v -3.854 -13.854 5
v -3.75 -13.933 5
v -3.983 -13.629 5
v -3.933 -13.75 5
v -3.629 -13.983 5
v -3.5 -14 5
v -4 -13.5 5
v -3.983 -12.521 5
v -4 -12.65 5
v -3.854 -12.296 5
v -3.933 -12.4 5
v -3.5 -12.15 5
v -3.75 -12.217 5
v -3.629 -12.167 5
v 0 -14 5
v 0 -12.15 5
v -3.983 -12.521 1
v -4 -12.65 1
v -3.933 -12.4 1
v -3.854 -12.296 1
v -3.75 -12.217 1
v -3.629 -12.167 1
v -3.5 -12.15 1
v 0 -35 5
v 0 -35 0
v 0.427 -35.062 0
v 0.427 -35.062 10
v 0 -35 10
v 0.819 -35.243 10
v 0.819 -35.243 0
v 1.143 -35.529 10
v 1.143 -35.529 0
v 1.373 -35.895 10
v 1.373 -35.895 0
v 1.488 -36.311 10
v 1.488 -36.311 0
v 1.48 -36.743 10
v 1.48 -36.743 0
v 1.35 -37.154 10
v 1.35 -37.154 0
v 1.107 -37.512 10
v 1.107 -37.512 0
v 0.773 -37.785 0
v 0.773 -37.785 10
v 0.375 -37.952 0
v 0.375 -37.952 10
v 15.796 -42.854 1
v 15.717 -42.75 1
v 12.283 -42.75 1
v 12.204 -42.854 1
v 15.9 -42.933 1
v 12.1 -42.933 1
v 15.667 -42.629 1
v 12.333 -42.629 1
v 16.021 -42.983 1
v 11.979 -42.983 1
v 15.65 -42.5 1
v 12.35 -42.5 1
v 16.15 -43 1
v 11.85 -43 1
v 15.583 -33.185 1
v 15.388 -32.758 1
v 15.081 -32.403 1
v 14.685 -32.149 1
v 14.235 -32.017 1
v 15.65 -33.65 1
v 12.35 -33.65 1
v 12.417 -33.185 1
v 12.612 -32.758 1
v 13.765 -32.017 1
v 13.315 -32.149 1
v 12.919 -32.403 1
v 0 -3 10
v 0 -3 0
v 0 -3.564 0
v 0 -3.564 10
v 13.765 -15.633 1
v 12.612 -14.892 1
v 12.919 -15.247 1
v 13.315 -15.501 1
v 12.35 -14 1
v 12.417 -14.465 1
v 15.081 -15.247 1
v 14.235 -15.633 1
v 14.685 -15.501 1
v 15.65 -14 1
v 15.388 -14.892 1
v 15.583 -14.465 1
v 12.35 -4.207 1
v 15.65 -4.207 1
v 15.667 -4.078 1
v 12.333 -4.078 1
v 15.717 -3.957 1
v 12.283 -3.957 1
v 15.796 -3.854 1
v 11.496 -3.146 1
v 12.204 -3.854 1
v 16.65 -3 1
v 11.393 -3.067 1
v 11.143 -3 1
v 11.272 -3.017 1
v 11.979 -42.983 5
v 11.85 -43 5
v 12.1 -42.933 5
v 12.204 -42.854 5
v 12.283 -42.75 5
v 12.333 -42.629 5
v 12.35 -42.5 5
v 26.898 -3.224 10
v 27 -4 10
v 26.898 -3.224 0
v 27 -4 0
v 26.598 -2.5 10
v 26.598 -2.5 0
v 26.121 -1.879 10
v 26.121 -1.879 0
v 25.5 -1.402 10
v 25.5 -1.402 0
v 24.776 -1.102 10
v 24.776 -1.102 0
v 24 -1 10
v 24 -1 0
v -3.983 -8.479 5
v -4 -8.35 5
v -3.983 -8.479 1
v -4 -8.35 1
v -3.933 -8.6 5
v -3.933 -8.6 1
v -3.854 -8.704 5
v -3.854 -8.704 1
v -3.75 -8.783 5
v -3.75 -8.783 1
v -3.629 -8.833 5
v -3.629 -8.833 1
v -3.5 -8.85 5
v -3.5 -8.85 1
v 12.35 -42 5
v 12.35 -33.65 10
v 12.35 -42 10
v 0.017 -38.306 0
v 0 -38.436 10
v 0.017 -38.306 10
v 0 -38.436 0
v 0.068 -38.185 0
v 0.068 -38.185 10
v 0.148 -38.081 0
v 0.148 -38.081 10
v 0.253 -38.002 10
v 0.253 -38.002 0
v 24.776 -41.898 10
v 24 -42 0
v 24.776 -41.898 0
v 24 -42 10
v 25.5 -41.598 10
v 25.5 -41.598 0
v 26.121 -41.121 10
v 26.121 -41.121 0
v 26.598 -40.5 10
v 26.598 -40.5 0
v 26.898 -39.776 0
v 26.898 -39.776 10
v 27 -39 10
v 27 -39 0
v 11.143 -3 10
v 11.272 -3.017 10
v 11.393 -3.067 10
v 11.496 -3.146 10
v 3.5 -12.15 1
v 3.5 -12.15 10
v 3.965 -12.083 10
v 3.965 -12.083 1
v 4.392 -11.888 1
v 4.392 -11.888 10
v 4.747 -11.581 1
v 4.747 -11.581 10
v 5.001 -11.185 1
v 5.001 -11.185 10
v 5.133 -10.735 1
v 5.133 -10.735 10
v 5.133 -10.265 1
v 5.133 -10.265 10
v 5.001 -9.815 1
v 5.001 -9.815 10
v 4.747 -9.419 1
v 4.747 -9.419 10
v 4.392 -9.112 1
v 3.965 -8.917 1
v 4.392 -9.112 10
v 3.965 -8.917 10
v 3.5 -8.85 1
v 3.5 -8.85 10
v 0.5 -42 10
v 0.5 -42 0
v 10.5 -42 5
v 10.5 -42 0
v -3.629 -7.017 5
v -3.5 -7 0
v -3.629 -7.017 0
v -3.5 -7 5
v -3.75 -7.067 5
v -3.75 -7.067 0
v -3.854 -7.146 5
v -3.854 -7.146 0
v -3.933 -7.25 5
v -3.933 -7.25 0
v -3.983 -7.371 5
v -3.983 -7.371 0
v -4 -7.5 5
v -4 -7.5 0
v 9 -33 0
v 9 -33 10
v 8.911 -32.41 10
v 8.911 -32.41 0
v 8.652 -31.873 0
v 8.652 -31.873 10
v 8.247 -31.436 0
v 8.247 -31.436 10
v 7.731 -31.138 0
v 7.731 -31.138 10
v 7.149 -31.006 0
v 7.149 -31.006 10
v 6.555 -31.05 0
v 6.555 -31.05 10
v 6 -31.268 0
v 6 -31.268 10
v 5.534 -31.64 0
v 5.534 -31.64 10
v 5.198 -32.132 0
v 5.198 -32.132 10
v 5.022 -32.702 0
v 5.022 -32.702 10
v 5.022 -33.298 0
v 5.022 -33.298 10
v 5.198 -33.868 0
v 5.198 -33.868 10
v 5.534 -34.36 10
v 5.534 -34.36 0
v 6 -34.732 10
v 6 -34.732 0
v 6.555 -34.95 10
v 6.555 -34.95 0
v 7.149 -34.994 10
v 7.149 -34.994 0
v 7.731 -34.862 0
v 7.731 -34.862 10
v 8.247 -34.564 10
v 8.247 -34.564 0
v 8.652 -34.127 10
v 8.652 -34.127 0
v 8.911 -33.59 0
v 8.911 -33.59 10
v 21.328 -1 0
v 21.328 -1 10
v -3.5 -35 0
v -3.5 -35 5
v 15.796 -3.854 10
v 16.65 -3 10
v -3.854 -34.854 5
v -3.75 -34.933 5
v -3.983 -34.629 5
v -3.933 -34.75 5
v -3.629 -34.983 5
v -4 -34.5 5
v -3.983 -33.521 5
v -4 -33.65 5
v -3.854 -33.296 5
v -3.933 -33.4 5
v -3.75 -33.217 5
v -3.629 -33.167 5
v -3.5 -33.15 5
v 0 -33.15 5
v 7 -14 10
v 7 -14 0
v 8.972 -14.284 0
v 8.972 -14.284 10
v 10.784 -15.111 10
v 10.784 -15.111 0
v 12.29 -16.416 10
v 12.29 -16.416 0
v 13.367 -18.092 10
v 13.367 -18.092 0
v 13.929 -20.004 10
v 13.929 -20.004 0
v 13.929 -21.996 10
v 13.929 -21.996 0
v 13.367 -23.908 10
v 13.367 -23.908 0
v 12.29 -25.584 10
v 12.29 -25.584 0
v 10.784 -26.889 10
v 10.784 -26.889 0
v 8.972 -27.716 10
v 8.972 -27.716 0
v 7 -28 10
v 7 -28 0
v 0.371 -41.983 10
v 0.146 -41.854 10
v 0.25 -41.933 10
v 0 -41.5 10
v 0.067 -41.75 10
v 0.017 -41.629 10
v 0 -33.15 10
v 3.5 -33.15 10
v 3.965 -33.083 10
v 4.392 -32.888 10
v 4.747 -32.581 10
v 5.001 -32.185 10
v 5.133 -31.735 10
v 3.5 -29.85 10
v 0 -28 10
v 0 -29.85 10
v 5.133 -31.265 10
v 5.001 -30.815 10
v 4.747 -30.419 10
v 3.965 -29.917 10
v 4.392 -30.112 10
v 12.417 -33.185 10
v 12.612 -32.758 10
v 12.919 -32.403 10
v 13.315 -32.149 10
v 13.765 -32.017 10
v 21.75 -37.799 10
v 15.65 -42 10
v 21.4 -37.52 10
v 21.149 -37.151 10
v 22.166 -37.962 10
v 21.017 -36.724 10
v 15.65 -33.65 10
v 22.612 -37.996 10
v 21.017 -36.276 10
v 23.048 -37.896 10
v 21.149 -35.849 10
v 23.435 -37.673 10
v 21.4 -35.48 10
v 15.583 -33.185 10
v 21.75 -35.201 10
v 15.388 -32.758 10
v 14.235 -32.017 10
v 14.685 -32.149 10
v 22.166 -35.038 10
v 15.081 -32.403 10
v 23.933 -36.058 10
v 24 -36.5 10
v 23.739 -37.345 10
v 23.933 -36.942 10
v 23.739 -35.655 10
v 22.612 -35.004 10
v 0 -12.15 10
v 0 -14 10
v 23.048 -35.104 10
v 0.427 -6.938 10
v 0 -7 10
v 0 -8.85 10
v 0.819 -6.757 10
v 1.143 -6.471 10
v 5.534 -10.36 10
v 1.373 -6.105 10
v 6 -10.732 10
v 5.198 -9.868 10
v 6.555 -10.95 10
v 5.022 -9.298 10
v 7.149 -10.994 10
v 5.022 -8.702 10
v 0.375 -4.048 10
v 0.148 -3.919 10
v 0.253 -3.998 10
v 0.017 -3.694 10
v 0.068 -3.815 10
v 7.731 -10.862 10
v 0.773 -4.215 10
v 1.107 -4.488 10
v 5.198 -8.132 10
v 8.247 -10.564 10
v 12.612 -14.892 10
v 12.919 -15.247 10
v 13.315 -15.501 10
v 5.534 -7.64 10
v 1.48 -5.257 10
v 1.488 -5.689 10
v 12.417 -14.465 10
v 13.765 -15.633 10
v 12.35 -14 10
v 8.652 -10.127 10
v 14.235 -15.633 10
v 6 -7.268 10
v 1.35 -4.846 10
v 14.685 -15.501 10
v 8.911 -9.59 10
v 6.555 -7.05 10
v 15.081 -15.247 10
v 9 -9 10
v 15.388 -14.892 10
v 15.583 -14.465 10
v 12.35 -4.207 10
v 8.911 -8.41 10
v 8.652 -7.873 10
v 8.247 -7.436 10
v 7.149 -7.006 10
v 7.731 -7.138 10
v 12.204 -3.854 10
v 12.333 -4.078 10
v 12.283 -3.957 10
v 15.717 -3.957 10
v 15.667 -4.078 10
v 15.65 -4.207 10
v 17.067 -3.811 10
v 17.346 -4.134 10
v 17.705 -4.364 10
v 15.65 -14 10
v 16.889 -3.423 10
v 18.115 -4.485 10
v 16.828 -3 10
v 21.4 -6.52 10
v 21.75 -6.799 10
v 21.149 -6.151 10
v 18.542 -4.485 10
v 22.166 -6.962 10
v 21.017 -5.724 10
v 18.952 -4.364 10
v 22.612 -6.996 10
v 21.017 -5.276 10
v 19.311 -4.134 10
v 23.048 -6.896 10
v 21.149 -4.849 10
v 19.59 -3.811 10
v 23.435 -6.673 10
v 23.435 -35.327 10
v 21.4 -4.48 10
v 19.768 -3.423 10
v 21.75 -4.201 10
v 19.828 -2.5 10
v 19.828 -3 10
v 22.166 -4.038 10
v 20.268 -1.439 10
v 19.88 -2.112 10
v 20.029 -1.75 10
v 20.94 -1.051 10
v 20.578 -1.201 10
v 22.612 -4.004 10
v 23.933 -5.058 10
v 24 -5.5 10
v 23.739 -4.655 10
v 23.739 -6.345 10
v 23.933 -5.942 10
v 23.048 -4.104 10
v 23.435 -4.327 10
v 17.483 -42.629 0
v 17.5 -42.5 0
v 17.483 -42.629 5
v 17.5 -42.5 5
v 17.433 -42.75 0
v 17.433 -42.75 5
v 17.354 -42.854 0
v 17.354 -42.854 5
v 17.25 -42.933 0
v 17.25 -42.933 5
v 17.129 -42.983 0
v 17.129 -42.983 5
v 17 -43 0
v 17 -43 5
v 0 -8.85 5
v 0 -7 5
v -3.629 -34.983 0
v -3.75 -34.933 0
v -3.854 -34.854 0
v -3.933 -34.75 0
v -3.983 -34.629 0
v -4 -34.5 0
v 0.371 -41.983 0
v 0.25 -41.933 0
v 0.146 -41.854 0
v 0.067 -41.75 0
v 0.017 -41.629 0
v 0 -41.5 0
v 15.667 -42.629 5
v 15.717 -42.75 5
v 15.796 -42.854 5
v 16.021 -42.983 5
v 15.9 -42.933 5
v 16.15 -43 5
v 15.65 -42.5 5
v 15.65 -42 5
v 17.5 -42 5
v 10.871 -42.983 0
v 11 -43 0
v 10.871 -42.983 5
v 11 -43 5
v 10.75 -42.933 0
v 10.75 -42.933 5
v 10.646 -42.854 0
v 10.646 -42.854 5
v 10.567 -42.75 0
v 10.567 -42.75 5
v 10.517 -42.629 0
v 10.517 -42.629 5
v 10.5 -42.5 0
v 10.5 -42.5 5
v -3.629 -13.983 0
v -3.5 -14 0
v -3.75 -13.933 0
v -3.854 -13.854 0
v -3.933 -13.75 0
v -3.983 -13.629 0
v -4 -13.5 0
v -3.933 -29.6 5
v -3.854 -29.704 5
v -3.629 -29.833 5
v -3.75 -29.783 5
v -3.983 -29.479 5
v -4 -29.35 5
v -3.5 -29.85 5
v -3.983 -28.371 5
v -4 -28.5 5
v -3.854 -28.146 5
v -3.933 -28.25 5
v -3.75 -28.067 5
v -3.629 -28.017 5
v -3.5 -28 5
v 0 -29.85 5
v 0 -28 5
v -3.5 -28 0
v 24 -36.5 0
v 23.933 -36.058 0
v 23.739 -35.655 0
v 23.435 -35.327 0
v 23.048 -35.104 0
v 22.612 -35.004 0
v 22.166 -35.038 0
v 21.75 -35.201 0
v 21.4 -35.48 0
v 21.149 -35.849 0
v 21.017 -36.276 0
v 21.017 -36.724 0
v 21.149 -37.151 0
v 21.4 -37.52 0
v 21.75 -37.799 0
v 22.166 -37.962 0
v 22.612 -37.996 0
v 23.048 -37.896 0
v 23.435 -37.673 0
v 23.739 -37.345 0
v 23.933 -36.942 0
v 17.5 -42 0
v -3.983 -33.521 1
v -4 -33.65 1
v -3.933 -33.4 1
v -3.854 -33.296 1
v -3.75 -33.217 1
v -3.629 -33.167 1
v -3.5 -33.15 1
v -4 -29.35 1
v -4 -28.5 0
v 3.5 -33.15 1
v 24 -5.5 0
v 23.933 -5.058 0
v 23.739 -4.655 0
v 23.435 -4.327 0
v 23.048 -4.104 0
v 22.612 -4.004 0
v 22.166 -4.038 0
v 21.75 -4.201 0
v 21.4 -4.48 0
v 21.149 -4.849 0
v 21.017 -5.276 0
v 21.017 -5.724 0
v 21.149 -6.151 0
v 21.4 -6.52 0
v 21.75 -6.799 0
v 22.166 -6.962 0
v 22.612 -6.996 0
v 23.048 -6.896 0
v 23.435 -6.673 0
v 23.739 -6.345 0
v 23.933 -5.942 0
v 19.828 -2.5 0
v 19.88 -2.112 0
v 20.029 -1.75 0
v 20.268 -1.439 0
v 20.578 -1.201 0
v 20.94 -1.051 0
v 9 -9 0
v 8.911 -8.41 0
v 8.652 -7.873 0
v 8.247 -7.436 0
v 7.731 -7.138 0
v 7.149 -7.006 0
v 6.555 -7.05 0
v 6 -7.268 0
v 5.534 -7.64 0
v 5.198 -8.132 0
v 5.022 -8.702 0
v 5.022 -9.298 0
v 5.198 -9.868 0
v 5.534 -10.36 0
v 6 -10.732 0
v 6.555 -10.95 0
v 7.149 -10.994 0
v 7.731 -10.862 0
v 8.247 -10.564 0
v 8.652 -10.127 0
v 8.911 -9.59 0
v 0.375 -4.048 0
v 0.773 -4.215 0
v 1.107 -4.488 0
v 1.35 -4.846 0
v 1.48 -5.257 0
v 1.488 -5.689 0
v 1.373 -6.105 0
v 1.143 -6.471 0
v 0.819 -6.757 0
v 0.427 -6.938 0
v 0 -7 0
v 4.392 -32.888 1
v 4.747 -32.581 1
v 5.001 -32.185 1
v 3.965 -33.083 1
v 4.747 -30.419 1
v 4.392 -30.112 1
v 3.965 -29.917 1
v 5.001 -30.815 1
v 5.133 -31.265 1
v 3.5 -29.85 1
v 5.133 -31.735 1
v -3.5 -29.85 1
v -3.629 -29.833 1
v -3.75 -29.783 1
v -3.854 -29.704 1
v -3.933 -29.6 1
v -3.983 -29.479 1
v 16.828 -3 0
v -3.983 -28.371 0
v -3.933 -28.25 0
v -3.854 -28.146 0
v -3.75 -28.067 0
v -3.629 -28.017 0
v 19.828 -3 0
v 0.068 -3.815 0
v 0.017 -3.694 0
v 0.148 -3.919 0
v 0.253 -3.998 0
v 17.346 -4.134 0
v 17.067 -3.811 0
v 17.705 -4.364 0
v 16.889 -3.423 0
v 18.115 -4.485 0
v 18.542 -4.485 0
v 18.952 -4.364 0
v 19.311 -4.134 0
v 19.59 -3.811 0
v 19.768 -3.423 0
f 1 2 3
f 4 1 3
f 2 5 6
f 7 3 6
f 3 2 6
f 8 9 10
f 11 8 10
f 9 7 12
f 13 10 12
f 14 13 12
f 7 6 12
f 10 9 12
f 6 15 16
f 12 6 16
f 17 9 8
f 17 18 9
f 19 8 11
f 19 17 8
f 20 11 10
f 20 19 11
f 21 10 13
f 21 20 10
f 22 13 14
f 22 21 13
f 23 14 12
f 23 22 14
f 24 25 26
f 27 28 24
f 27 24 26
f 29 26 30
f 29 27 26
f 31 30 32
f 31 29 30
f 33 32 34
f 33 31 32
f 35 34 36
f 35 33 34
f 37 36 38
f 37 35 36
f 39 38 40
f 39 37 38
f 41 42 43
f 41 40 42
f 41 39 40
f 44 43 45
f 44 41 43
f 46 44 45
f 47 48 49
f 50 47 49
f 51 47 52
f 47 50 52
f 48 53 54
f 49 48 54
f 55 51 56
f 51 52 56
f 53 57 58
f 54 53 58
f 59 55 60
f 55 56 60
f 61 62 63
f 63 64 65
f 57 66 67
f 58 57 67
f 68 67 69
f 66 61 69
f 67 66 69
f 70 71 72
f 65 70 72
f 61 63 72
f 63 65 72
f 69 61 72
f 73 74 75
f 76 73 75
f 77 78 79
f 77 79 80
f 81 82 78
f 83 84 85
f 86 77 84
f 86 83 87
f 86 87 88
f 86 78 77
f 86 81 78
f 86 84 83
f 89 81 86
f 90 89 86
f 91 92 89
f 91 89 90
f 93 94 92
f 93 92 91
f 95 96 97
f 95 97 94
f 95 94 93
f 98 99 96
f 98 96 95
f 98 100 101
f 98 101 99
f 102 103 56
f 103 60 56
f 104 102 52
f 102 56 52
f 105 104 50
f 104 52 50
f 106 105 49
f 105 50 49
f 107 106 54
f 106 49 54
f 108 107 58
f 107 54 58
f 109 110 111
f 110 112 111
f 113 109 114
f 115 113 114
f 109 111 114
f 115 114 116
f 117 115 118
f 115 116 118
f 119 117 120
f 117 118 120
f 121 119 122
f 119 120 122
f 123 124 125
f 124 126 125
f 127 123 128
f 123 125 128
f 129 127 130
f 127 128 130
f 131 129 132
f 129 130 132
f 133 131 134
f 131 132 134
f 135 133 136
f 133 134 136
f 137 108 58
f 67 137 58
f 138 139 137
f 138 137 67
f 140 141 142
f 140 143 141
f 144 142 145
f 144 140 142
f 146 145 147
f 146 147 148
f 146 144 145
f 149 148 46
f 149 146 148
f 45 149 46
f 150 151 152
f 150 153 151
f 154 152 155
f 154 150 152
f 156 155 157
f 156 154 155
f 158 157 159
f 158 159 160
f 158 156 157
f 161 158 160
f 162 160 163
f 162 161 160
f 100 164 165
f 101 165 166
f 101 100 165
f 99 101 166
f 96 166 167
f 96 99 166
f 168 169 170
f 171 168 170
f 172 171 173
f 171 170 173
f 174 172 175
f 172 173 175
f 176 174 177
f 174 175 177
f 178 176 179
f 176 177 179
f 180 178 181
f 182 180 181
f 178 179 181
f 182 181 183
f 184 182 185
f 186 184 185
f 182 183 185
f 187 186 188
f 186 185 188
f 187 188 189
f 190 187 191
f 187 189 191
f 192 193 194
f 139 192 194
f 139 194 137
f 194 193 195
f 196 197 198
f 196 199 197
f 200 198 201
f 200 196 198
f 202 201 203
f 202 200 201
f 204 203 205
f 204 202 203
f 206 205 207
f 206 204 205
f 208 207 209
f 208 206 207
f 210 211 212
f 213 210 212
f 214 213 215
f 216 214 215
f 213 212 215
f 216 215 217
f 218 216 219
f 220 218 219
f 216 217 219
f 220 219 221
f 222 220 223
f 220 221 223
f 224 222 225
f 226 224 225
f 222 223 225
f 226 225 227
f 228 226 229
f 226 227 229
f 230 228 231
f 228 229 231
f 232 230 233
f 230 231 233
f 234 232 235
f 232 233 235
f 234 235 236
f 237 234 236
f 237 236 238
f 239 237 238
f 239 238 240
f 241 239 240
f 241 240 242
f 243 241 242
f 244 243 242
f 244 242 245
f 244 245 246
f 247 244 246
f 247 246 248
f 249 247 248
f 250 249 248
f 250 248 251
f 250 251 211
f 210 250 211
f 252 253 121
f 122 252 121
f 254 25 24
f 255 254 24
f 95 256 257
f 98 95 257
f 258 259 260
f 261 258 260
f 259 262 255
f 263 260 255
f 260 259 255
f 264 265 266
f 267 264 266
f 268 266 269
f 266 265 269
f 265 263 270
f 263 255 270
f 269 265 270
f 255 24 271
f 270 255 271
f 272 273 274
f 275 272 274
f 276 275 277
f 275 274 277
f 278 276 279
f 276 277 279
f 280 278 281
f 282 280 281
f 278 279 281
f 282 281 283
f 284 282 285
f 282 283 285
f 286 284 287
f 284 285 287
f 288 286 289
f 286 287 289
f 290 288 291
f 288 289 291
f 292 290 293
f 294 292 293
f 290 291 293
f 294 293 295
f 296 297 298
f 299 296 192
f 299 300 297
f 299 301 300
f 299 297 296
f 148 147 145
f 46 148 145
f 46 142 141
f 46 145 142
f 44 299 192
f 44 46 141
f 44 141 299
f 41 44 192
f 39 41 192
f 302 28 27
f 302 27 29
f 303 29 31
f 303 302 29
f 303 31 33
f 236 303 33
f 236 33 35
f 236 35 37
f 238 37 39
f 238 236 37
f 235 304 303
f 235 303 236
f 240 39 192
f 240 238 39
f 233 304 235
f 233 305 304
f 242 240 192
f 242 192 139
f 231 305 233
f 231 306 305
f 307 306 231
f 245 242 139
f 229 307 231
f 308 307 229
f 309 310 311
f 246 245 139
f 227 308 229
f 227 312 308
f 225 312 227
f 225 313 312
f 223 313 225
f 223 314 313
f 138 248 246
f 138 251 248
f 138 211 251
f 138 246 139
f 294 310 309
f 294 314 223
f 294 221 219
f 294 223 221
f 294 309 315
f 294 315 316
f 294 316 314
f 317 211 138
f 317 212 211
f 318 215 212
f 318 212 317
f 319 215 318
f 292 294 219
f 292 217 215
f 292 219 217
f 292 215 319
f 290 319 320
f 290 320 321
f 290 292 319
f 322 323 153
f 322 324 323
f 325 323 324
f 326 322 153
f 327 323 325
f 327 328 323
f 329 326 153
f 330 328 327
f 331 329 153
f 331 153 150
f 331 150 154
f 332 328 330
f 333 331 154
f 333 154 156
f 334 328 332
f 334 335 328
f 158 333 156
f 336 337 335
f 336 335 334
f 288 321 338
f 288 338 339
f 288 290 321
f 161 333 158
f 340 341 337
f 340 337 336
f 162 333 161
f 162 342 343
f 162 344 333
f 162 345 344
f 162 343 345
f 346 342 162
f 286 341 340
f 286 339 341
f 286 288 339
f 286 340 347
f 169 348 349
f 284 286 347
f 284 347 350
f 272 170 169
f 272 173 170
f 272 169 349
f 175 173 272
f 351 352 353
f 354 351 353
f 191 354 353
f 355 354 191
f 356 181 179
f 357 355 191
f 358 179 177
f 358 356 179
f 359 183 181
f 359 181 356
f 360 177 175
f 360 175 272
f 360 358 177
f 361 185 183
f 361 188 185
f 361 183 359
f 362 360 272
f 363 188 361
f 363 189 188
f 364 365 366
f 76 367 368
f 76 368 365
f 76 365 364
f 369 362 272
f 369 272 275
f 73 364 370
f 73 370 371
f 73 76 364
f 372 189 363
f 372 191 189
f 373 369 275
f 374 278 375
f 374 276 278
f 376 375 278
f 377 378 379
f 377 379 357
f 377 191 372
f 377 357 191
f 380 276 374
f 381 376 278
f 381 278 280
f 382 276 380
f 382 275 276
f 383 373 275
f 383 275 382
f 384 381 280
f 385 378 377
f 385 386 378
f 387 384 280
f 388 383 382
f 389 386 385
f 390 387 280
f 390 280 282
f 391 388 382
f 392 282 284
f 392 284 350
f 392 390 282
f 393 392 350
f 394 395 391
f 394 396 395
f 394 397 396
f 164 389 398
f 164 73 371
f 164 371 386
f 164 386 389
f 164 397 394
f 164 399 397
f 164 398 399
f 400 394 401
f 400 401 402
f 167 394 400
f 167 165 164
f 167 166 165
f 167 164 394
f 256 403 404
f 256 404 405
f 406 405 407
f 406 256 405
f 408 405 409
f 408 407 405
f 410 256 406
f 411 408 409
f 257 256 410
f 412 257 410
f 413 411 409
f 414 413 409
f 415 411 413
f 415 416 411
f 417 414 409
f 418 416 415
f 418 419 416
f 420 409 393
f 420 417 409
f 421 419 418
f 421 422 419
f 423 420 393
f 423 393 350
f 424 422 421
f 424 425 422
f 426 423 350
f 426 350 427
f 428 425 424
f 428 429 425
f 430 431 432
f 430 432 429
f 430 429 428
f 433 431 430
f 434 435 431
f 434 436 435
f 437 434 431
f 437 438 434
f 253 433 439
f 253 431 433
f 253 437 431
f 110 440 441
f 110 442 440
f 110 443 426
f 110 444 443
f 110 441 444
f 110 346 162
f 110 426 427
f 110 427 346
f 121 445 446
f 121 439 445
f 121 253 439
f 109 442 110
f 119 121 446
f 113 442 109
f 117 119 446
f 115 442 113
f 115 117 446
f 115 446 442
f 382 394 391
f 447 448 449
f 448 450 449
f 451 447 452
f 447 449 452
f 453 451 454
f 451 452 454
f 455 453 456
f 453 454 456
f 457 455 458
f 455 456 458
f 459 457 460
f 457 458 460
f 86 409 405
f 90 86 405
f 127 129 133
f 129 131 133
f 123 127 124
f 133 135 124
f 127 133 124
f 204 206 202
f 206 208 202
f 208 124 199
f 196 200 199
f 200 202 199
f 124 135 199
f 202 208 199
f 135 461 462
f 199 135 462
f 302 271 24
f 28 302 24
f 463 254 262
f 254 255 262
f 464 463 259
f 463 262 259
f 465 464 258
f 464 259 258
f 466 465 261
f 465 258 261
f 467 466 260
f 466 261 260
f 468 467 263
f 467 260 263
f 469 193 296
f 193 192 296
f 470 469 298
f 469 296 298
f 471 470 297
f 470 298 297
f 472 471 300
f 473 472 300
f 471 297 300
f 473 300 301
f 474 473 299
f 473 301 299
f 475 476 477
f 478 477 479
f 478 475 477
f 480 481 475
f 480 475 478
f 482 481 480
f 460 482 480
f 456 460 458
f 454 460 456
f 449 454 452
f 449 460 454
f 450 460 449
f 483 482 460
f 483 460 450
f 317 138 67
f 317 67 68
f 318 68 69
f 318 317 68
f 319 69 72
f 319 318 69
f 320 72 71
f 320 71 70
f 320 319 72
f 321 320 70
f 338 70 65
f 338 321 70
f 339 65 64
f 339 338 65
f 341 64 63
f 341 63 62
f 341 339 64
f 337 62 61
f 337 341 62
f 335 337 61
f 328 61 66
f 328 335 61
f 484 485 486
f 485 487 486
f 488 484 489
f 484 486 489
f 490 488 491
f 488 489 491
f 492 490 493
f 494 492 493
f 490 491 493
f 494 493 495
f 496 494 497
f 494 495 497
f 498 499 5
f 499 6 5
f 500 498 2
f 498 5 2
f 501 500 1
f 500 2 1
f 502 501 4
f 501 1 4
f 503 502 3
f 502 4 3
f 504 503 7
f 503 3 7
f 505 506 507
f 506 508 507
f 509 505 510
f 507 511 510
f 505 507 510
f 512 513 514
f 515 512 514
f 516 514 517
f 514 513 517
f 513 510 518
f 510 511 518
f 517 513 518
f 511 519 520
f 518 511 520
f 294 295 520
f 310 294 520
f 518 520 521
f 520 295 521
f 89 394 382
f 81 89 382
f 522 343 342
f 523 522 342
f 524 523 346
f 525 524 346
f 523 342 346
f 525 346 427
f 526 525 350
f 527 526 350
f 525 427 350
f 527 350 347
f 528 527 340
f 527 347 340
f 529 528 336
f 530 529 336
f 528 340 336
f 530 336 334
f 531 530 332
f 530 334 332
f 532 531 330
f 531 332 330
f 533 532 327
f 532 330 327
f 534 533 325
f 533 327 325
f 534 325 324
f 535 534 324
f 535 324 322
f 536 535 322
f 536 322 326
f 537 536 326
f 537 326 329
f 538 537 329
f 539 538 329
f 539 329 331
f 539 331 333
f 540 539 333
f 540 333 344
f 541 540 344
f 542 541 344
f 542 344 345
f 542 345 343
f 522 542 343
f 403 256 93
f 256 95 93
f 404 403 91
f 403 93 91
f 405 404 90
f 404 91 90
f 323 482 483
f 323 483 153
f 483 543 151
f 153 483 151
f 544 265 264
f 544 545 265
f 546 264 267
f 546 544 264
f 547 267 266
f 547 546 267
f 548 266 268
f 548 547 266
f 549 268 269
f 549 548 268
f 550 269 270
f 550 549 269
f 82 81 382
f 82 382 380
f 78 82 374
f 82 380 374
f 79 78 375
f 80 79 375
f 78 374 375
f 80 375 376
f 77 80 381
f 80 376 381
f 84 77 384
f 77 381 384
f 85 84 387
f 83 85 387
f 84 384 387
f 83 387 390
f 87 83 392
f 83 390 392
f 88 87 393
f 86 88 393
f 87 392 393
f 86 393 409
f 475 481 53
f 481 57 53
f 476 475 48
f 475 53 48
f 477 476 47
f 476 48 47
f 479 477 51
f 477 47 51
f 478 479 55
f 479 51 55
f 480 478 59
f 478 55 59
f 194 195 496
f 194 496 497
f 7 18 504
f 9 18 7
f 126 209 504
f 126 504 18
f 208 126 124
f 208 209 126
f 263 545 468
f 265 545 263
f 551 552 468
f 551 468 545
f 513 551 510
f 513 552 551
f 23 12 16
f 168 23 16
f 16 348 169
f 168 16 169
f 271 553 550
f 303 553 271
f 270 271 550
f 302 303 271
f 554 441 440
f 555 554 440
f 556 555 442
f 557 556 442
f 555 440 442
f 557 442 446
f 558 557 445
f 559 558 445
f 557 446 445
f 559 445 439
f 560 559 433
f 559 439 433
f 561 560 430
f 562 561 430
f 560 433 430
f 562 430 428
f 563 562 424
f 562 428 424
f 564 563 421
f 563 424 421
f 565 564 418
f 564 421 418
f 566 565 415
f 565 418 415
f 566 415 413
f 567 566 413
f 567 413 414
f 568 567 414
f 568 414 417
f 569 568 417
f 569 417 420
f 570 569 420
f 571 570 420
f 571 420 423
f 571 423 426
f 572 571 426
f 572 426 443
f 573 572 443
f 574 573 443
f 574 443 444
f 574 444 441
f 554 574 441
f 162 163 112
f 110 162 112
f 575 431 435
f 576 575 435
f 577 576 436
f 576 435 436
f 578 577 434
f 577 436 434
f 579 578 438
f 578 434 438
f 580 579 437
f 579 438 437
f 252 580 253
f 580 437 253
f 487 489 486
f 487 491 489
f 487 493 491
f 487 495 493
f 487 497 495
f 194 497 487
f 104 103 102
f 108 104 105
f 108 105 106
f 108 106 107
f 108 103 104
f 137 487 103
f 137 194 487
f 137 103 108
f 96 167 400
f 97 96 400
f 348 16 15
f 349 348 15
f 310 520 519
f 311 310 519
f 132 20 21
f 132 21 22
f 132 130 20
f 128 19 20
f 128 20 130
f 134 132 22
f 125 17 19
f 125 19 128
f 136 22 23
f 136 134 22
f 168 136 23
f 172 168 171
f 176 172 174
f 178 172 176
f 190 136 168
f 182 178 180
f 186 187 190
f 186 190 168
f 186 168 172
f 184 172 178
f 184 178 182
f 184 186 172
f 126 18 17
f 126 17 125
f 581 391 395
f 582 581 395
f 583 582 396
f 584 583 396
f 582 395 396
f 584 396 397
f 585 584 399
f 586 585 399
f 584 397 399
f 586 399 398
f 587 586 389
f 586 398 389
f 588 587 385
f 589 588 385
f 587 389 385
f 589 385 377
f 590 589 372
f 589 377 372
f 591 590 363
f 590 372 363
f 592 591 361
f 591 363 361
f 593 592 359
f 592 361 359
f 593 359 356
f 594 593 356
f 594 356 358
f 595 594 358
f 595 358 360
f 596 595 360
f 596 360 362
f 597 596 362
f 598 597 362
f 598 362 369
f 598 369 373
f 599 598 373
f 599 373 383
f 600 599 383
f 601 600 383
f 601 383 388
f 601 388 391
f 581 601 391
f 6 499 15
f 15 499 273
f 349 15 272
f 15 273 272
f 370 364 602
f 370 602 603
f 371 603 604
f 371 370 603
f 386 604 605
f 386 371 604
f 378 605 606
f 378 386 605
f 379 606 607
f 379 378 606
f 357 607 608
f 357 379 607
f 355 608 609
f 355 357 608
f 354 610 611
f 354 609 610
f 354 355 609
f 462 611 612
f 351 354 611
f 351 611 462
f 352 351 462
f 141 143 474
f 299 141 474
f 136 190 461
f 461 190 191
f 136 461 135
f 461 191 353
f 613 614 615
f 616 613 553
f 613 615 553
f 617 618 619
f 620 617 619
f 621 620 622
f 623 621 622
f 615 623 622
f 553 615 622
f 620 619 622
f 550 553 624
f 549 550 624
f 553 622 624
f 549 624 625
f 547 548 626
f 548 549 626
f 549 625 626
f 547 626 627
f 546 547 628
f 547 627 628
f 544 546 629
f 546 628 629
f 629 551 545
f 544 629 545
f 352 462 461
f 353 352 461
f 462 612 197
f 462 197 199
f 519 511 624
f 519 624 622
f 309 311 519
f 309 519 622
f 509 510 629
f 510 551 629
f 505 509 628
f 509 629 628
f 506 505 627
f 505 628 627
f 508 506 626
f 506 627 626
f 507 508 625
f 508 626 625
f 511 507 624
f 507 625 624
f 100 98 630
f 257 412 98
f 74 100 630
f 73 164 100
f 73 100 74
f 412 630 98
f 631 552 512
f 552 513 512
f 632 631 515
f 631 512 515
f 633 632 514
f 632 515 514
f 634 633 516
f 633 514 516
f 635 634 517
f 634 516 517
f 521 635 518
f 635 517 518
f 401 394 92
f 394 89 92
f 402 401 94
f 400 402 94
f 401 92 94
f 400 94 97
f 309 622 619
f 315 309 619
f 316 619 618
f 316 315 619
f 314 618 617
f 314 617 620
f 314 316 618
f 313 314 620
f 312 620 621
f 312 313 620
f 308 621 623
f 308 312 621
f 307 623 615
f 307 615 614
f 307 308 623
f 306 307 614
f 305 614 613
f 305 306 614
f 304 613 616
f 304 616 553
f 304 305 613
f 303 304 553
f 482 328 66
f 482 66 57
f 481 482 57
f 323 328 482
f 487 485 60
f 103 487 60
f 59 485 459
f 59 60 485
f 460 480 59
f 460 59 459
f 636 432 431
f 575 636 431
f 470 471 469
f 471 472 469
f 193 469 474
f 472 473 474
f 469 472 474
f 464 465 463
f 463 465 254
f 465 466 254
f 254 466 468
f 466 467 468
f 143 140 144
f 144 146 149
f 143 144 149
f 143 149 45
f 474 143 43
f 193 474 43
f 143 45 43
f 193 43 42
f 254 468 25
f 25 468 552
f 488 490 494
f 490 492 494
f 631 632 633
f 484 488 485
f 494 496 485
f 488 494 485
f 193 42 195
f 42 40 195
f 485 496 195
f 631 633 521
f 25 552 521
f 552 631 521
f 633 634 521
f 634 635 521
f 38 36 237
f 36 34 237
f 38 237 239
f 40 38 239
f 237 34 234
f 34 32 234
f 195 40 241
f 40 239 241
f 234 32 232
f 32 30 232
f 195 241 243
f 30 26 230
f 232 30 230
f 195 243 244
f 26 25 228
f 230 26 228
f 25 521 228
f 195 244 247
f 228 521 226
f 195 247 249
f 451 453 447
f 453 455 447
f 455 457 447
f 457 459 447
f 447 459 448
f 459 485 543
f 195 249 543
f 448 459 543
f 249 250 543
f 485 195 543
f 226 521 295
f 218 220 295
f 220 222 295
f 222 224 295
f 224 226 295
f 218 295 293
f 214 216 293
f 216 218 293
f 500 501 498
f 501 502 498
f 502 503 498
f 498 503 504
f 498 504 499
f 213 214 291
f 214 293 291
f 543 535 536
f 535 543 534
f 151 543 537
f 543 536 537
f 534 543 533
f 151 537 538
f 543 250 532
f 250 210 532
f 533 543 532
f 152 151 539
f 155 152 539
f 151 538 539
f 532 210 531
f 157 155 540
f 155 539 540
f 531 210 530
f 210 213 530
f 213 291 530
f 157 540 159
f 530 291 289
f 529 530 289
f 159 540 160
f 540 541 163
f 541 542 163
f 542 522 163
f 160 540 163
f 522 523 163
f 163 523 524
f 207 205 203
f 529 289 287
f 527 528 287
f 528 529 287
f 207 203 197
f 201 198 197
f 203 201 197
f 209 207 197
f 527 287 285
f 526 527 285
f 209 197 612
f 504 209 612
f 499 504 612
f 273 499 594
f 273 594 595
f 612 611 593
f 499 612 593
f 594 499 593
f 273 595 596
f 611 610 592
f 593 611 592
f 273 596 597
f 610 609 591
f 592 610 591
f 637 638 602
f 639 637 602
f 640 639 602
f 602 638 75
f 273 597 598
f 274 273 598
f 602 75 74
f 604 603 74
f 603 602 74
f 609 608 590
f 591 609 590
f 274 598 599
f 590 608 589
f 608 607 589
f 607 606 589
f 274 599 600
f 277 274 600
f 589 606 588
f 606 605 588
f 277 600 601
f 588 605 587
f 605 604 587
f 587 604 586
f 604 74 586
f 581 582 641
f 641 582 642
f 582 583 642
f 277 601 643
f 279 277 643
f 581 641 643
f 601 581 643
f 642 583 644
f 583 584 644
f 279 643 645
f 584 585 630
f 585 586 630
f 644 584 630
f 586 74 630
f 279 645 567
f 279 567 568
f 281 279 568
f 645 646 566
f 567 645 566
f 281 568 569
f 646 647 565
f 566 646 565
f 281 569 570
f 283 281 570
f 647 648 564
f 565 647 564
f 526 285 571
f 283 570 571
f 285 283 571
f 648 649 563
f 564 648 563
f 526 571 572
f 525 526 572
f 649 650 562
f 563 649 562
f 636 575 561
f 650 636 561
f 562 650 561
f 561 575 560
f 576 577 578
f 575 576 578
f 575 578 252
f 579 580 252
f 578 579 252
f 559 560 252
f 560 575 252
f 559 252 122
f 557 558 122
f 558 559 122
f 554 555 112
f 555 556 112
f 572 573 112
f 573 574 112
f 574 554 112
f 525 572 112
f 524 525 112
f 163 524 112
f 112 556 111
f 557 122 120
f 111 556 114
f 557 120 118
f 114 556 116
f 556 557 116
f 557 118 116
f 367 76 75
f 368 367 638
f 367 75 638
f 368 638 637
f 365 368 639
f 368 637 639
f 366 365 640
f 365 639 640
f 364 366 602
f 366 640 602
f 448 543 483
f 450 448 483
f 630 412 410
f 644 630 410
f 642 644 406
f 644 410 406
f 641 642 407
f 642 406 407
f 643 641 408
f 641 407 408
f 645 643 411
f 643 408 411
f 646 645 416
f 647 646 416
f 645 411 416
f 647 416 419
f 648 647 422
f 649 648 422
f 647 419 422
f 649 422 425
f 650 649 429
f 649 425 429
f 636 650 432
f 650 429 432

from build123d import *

# Parameters (mm, degrees)
BOSS_EXTRUDE5_DEPTH = 10
SKETCH32_W          = 5
SKETCH32_H          = 7
BOSS_EXTRUDE6_DEPTH = 4
SKETCH15_R          = 2
SKETCH15_R_2        = 1.5
CUT_EXTRUDE8_DEPTH  = 51.921508226
CUT_EXTRUDE18_DEPTH = 9
CUT_EXTRUDE19_DEPTH = 51.921508226
SKETCH20_W          = 18.573206134
SKETCH20_H          = 9.890954849
CUT_EXTRUDE12_DEPTH = 51.921508226
SKETCH28_W          = 11
SKETCH28_H          = 1
CUT_EXTRUDE15_DEPTH = 10
SKETCH37_W          = 7
SKETCH37_H          = 5
BOSS_EXTRUDE7_DEPTH = 1
CUT_EXTRUDE11_DEPTH = 9
CUT_EXTRUDE20_DEPTH = 52.749396132
BOSS_EXTRUDE8_START = -1
BOSS_EXTRUDE8_DEPTH = 1
FILLET15_R          = 3
FILLET16_R          = 0.5


with BuildPart() as part:
    # Sketch14 → Boss-Extrude5 (new body)
    with BuildSketch(Plane.XY):
        with BuildLine():
            Line((27, -8.5), (27, 0))
            Line((27, 0), (0, 0))
            Line((0, 0), (0, -14))
            Line((0, -14), (7, -14))
            ThreePointArc((7, -14), (14, -21), (7, -28))
            Line((7, -28), (0, -28))
            Line((0, -28), (0, -42))
            Line((0, -42), (27, -42))
            Line((27, -42), (27, -33.5))
            Line((27, -33.5), (27, -8.5))
        make_face()
    extrude(amount=BOSS_EXTRUDE5_DEPTH)

    # Sketch32 → Boss-Extrude6 (add)
    with BuildSketch(Plane.ZY):
        with Locations((2.5, -10.5)):
            Rectangle(SKETCH32_W, SKETCH32_H)
        with Locations((2.5, -31.5)):
            Rectangle(SKETCH32_W, SKETCH32_H)
    extrude(amount=BOSS_EXTRUDE6_DEPTH)

    # Sketch15 → Cut-Extrude8 (cut, through all)
    with BuildSketch(Plane.XY.offset(10)):
        with Locations((7, -9)):
            Circle(SKETCH15_R)
        with Locations((22.5, -5.5)):
            Circle(SKETCH15_R_2)
        with Locations((22.5, -36.5)):
            Circle(SKETCH15_R_2)
        with Locations((7, -33)):
            Circle(SKETCH15_R)
        with Locations((-8.5, -36.5)):
            Circle(SKETCH15_R_2)
    extrude(amount=-CUT_EXTRUDE8_DEPTH, mode=Mode.SUBTRACT)

    # Sketch33 → Cut-Extrude18 (cut)
    with BuildSketch(Plane.XY.offset(10)):
        with BuildLine():
            Line((-4, -29.85), (3.5, -29.85))
            ThreePointArc((3.5, -29.85), (5.15, -31.5), (3.5, -33.15))
            Line((3.5, -33.15), (-4, -33.15))
            ThreePointArc((-4, -33.15), (-5.65, -31.5), (-4, -29.85))
        make_face()
        with BuildLine():
            Line((-4, -12.15), (3.5, -12.15))
            ThreePointArc((3.5, -12.15), (5.15, -10.5), (3.5, -8.85))
            Line((3.5, -8.85), (-4, -8.85))
            ThreePointArc((-4, -8.85), (-5.65, -10.5), (-4, -12.15))
        make_face()
    extrude(amount=-CUT_EXTRUDE18_DEPTH, mode=Mode.SUBTRACT)

    # Sketch34 → Cut-Extrude19 (cut, through all)
    with BuildSketch(Plane.XY.offset(10)):
        with BuildLine():
            Line((0, -7), (-4.5, -7))
            ThreePointArc((-4.5, -7), (-6, -5.5), (-4.5, -4))
            Line((-4.5, -4), (0, -4))
            ThreePointArc((0, -4), (1.5, -5.5), (0, -7))
        make_face()
        with BuildLine():
            Line((0, -38), (-4, -38))
            ThreePointArc((-4, -38), (-5.5, -36.5), (-4, -35))
            Line((-4, -35), (0, -35))
            ThreePointArc((0, -35), (1.5, -36.5), (0, -38))
        make_face()
    extrude(amount=-CUT_EXTRUDE19_DEPTH, mode=Mode.SUBTRACT)

    # Sketch20 → Cut-Extrude12 (cut, through all)
    with BuildSketch(Plane.XY.offset(10)):
        with Locations((6.713396933, 2.275477425)):
            Rectangle(SKETCH20_W, SKETCH20_H)
    extrude(amount=-CUT_EXTRUDE12_DEPTH, mode=Mode.SUBTRACT)

    # Sketch28 → Cut-Extrude15 (cut)
    with BuildSketch(Plane.XY.offset(10)):
        with Locations((21.5, -0.5)):
            Rectangle(SKETCH28_W, SKETCH28_H)
    extrude(amount=-CUT_EXTRUDE15_DEPTH, mode=Mode.SUBTRACT)

    # Sketch37 → Boss-Extrude7 (add)
    with BuildSketch(Plane.XZ.offset(42)):
        with Locations((14, 2.5)):
            Rectangle(SKETCH37_W, SKETCH37_H)
    extrude(amount=BOSS_EXTRUDE7_DEPTH)

    # Sketch19 → Cut-Extrude11 (cut)
    with BuildSketch(Plane.XY.offset(10)):
        with BuildLine():
            Line((15.65, -33.65), (15.65, -43))
            ThreePointArc((15.65, -43), (14, -44.65), (12.35, -43))
            Line((12.35, -43), (12.35, -33.65))
            ThreePointArc((12.35, -33.65), (14, -32), (15.65, -33.65))
        make_face()
    extrude(amount=-CUT_EXTRUDE11_DEPTH, mode=Mode.SUBTRACT)

    # Sketch35 → Cut-Extrude20 (cut, through all)
    with BuildSketch(Plane.XY.offset(10)):
        with BuildLine():
            Line((11.35, -3), (12.35, -4))
            Line((12.35, -4), (12.35, -14))
            ThreePointArc((12.35, -14), (14, -15.65), (15.65, -14))
            Line((15.65, -14), (15.65, -4))
            Line((15.65, -4), (16.65, -3))
            Line((16.65, -3), (16.828427125, -3))
            ThreePointArc((16.828427125, -3), (18.328427125, -4.5), (19.828427125, -3))
            Line((19.828427125, -3), (19.828427125, -2.5))
            ThreePointArc((19.828427125, -2.5), (20.267766953, -1.439339828), (21.328427125, -1))
            Line((21.328427125, -1), (16, -1))
            Line((16, -1), (16, -2.67))
            Line((16, -2.67), (0, -2.67))
            Line((0, -2.67), (0, -3))
            Line((0, -3), (11.35, -3))
        make_face()
    extrude(amount=-CUT_EXTRUDE20_DEPTH, mode=Mode.SUBTRACT)

    # Sketch39 → Boss-Extrude8 (add)
    with BuildSketch(Plane(origin=(0, 0, 0), x_dir=(-1, 0, 0), z_dir=(0, 0, -1)).offset(BOSS_EXTRUDE8_START)):
        with BuildLine():
            Line((-15.65, -4), (-16.65, -3))
            Line((-16.65, -3), (-11.35, -3))
            Line((-11.35, -3), (-12.35, -4))
            Line((-12.35, -4), (-12.35, -14))
            ThreePointArc((-12.35, -14), (-14, -15.65), (-15.65, -14))
            Line((-15.65, -14), (-15.65, -4))
        make_face()
    extrude(amount=BOSS_EXTRUDE8_DEPTH)

    # Fillet15
    fillet15_edges = [part.edges().sort_by_distance(p)[0] for p in [
        (27, -42, 5),
        (27, -1, 5),
    ]]
    fillet(fillet15_edges, radius=FILLET15_R)

    # Fillet16
    fillet16_edges = [part.edges().sort_by_distance(p)[0] for p in [
        (0, -42, 5),
        (-4, -35, 2.5),
        (-4, -33.15, 3),
        (-4, -29.85, 3),
        (-4, -28, 2.5),
        (-4, -14, 2.5),
        (-4, -7, 2.5),
        (-4, -12.15, 3),
        (-4, -8.85, 3),
        (0, -4, 5),
        (0, -38, 5),
        (10.5, -43, 2.5),
        (17.5, -43, 2.5),
        (15.65, -43, 3),
        (12.35, -43, 3),
        (15.65, -4, 5.5),
        (12.35, -4, 5.5),
        (11.35, -3, 5.5),
    ]]
    fillet(fillet16_edges, radius=FILLET16_R)


solid = part.part
